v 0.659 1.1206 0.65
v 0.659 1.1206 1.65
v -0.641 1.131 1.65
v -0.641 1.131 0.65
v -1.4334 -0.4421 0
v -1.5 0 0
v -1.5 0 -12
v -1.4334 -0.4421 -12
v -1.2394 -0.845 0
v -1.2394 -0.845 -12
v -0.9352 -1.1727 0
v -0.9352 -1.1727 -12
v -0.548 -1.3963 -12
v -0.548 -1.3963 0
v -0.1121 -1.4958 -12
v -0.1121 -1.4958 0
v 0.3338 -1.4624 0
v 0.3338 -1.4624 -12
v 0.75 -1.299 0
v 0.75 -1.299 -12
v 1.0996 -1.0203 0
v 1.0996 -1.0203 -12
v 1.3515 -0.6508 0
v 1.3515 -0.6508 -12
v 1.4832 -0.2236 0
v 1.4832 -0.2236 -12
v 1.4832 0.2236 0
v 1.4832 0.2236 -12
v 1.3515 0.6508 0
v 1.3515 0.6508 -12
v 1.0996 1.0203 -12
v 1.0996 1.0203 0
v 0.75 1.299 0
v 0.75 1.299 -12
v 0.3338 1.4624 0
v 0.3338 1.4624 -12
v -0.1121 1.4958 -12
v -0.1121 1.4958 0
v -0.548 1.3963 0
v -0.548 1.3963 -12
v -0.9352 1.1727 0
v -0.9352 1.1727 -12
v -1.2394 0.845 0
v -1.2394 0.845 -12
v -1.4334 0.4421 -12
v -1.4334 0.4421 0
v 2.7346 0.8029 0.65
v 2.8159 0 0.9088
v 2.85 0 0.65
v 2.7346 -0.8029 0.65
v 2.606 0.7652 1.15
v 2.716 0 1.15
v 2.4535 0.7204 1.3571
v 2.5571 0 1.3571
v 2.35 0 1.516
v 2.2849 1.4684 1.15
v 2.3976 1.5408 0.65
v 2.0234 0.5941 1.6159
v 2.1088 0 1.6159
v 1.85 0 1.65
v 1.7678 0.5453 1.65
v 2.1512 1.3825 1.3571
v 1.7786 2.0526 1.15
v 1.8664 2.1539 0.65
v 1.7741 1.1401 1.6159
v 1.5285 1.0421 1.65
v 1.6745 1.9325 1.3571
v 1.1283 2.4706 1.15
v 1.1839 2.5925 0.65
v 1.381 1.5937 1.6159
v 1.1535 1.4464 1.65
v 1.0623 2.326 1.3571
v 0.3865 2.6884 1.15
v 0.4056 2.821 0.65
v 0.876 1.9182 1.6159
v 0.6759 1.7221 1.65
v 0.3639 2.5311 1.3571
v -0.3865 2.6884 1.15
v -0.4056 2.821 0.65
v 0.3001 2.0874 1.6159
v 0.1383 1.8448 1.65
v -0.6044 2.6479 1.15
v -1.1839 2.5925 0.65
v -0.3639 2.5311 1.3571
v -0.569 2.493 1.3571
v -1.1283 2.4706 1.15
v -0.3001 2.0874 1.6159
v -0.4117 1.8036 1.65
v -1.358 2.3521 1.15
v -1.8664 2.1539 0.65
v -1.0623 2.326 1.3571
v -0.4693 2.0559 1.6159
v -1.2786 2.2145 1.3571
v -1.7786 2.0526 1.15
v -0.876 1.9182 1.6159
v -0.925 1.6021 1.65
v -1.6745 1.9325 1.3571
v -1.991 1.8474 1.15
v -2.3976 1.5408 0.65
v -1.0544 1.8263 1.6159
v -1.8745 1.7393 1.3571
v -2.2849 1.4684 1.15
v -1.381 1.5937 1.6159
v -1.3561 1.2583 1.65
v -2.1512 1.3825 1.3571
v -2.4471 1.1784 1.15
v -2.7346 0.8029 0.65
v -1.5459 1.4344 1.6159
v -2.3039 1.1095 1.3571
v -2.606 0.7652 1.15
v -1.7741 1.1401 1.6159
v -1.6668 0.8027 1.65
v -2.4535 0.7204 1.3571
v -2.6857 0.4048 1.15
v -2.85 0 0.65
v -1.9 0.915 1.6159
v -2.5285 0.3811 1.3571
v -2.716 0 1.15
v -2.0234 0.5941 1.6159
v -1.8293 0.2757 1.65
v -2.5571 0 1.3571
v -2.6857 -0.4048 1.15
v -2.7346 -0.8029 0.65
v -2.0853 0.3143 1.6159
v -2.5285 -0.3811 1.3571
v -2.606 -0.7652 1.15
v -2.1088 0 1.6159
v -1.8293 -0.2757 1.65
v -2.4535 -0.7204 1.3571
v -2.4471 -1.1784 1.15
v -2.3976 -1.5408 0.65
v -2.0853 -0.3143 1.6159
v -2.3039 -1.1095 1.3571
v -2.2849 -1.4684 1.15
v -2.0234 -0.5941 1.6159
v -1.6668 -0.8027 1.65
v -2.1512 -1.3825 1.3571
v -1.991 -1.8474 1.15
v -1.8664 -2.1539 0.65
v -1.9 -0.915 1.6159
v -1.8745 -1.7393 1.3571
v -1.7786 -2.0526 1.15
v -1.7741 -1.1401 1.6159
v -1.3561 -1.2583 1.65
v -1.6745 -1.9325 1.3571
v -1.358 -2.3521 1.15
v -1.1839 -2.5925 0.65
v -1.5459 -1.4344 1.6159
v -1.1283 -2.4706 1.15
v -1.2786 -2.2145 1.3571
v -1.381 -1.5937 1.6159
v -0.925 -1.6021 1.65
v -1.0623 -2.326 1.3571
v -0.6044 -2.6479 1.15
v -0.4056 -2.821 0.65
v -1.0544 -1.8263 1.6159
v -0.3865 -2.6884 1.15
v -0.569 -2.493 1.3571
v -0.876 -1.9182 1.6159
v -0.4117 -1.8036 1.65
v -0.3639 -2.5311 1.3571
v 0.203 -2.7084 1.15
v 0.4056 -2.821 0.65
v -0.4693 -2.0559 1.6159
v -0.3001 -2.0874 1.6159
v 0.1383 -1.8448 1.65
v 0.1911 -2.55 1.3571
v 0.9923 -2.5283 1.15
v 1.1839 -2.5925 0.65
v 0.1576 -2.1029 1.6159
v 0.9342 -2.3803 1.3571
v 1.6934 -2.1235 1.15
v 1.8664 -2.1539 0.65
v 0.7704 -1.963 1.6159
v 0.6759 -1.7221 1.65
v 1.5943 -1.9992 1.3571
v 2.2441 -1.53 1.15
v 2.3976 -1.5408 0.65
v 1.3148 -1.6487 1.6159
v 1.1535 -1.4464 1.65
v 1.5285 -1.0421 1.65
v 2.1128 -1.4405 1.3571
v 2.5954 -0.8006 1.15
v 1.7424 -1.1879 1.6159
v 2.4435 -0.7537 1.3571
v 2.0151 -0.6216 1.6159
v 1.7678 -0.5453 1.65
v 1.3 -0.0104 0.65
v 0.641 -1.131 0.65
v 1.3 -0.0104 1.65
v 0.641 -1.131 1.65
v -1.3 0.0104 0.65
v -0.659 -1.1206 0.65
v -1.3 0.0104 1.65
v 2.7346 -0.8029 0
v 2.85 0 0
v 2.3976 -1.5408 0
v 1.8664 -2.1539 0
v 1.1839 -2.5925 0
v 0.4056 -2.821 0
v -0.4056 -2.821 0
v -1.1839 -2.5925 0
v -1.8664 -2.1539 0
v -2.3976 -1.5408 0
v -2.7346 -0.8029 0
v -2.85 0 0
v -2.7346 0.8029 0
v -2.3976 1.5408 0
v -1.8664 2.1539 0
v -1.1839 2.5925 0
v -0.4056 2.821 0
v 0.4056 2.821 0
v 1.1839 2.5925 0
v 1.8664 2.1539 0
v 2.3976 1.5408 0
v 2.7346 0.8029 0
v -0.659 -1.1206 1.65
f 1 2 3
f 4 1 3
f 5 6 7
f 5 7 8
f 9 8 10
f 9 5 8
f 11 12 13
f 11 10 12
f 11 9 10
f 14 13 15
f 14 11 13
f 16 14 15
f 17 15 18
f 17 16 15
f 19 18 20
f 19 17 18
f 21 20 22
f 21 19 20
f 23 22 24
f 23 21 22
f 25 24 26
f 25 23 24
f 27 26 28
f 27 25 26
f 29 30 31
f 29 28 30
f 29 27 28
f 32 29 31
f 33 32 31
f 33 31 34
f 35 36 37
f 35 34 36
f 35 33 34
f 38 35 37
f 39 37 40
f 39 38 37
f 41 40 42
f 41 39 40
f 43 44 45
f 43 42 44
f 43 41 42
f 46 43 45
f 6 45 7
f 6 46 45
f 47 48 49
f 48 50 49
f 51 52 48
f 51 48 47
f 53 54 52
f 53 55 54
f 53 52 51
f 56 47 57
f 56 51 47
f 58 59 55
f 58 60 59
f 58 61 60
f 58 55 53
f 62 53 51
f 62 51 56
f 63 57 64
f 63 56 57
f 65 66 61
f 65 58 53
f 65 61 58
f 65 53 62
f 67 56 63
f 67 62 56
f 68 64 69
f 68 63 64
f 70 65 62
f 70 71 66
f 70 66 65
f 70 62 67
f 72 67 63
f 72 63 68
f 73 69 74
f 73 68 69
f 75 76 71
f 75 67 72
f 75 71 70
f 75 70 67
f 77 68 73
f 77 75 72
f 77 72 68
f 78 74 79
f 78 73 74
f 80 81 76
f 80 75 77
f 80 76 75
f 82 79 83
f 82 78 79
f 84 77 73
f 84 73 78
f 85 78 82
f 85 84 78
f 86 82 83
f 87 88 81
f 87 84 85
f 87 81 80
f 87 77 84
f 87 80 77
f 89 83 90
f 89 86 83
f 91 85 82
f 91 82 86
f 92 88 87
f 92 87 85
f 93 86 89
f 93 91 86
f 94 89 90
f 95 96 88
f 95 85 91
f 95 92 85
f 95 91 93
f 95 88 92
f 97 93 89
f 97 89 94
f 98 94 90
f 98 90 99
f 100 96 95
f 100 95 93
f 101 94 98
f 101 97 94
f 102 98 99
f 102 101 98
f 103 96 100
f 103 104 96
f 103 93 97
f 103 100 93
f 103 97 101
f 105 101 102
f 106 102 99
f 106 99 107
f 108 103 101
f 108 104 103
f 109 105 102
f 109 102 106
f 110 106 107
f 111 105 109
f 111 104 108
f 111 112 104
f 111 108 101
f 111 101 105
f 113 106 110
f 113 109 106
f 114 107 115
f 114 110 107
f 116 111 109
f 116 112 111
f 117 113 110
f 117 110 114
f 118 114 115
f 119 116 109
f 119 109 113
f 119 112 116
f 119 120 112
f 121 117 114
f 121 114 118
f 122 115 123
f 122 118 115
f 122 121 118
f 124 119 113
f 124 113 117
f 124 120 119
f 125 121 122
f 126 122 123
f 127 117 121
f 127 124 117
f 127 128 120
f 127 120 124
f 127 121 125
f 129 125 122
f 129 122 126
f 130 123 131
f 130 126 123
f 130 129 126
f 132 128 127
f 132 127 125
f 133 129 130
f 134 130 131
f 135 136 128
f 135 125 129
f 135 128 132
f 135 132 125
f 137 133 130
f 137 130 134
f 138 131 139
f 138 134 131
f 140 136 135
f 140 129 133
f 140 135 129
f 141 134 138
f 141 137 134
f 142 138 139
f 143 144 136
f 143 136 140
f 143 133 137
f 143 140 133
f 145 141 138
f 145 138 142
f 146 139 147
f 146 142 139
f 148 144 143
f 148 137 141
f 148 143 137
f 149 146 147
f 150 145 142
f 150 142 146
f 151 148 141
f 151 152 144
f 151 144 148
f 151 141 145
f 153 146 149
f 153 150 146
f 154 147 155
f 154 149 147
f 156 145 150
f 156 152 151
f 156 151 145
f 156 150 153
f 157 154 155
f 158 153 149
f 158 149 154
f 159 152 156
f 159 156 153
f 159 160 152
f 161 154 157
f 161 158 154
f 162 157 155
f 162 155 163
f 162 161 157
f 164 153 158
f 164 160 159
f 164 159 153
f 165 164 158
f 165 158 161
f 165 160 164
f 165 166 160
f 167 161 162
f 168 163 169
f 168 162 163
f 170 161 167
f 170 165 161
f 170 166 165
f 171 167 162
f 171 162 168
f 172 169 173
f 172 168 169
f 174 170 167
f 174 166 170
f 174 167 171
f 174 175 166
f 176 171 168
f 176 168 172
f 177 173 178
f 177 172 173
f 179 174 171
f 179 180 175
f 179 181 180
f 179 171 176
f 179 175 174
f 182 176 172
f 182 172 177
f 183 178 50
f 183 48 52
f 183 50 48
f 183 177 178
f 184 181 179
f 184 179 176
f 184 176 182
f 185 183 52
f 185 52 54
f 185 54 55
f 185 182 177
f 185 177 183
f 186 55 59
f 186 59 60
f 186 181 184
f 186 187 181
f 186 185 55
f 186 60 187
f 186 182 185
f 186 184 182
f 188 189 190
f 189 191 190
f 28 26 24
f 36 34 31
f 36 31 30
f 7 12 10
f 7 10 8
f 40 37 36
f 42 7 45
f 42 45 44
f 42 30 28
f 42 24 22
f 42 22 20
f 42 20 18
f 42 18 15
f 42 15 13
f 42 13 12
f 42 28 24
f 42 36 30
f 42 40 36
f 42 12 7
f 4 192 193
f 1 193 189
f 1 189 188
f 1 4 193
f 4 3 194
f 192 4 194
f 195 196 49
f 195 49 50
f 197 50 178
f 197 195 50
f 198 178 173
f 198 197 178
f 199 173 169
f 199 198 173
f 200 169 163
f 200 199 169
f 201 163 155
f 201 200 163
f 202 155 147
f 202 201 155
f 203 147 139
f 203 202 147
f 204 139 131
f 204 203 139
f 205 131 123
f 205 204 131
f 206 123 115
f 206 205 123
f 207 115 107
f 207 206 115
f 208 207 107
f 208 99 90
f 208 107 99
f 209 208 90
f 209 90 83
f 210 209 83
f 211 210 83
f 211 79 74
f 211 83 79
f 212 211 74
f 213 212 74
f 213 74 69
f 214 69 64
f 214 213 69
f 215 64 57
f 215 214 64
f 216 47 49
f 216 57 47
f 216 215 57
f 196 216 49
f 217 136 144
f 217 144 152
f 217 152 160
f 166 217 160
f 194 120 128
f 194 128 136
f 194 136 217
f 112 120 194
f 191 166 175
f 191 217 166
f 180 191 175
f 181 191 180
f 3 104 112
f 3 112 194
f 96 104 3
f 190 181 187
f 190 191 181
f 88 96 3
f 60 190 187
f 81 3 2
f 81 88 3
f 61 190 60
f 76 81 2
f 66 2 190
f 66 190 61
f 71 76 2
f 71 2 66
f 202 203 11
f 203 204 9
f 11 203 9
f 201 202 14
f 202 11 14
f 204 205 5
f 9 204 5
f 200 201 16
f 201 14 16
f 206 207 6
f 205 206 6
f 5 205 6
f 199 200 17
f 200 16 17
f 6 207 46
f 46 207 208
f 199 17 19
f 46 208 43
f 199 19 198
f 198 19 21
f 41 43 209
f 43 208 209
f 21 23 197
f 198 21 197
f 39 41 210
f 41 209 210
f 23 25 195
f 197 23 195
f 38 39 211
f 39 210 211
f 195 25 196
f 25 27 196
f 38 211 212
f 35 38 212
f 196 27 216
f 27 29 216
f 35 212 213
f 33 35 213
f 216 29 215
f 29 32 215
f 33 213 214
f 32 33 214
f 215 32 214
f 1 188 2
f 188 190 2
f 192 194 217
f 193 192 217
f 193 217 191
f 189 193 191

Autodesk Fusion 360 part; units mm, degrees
sketch "Sketch1" plane through (0, 0, 0) normal (0, 0, 1) x (1, 0, 0)
  circle A0 centre (0, 0) radius 2.85
  dimension "d1" = 5.7
extrude "Extrude1" add sketch "Sketch1" along normal blind 1.65
fillet "Fillet1" radius 1 1 edges at (-2.6571, -1.0306, 1.65)
sketch "Sketch2" plane through (0, 0, 1.65) normal (0, 0, 1) x (1, 0, 0)
  circle A0 centre (0, 0) radius 1.85
  line L0 (-0.641, 1.131) -> (-1.3, 0.0104)
  line L1 (-1.3, 0.0104) -> (-0.659, -1.1206)
  line L2 (-0.659, -1.1206) -> (0.641, -1.131)
  line L3 (0.641, -1.131) -> (1.3, -0.0104)
  line L4 (1.3, -0.0104) -> (0.659, 1.1206)
  line L5 (0.659, 1.1206) -> (-0.641, 1.131)
  dimension "d6" = 1.3
extrude "Extrude2" cut sketch "Sketch2" against normal blind 1 contours L0 L1 L2 L3 L4 L5
sketch "Sketch3" plane through (0, 0, 0) normal (0, 0, -1) x (-1, 0, 0)
  circle A0 centre (0, 0) radius 2.85
  circle A1 centre (0, 0) radius 1.5
  dimension "d9" = 3
extrude "Extrude3" add sketch "Sketch3" along normal blind 12 contours A1
